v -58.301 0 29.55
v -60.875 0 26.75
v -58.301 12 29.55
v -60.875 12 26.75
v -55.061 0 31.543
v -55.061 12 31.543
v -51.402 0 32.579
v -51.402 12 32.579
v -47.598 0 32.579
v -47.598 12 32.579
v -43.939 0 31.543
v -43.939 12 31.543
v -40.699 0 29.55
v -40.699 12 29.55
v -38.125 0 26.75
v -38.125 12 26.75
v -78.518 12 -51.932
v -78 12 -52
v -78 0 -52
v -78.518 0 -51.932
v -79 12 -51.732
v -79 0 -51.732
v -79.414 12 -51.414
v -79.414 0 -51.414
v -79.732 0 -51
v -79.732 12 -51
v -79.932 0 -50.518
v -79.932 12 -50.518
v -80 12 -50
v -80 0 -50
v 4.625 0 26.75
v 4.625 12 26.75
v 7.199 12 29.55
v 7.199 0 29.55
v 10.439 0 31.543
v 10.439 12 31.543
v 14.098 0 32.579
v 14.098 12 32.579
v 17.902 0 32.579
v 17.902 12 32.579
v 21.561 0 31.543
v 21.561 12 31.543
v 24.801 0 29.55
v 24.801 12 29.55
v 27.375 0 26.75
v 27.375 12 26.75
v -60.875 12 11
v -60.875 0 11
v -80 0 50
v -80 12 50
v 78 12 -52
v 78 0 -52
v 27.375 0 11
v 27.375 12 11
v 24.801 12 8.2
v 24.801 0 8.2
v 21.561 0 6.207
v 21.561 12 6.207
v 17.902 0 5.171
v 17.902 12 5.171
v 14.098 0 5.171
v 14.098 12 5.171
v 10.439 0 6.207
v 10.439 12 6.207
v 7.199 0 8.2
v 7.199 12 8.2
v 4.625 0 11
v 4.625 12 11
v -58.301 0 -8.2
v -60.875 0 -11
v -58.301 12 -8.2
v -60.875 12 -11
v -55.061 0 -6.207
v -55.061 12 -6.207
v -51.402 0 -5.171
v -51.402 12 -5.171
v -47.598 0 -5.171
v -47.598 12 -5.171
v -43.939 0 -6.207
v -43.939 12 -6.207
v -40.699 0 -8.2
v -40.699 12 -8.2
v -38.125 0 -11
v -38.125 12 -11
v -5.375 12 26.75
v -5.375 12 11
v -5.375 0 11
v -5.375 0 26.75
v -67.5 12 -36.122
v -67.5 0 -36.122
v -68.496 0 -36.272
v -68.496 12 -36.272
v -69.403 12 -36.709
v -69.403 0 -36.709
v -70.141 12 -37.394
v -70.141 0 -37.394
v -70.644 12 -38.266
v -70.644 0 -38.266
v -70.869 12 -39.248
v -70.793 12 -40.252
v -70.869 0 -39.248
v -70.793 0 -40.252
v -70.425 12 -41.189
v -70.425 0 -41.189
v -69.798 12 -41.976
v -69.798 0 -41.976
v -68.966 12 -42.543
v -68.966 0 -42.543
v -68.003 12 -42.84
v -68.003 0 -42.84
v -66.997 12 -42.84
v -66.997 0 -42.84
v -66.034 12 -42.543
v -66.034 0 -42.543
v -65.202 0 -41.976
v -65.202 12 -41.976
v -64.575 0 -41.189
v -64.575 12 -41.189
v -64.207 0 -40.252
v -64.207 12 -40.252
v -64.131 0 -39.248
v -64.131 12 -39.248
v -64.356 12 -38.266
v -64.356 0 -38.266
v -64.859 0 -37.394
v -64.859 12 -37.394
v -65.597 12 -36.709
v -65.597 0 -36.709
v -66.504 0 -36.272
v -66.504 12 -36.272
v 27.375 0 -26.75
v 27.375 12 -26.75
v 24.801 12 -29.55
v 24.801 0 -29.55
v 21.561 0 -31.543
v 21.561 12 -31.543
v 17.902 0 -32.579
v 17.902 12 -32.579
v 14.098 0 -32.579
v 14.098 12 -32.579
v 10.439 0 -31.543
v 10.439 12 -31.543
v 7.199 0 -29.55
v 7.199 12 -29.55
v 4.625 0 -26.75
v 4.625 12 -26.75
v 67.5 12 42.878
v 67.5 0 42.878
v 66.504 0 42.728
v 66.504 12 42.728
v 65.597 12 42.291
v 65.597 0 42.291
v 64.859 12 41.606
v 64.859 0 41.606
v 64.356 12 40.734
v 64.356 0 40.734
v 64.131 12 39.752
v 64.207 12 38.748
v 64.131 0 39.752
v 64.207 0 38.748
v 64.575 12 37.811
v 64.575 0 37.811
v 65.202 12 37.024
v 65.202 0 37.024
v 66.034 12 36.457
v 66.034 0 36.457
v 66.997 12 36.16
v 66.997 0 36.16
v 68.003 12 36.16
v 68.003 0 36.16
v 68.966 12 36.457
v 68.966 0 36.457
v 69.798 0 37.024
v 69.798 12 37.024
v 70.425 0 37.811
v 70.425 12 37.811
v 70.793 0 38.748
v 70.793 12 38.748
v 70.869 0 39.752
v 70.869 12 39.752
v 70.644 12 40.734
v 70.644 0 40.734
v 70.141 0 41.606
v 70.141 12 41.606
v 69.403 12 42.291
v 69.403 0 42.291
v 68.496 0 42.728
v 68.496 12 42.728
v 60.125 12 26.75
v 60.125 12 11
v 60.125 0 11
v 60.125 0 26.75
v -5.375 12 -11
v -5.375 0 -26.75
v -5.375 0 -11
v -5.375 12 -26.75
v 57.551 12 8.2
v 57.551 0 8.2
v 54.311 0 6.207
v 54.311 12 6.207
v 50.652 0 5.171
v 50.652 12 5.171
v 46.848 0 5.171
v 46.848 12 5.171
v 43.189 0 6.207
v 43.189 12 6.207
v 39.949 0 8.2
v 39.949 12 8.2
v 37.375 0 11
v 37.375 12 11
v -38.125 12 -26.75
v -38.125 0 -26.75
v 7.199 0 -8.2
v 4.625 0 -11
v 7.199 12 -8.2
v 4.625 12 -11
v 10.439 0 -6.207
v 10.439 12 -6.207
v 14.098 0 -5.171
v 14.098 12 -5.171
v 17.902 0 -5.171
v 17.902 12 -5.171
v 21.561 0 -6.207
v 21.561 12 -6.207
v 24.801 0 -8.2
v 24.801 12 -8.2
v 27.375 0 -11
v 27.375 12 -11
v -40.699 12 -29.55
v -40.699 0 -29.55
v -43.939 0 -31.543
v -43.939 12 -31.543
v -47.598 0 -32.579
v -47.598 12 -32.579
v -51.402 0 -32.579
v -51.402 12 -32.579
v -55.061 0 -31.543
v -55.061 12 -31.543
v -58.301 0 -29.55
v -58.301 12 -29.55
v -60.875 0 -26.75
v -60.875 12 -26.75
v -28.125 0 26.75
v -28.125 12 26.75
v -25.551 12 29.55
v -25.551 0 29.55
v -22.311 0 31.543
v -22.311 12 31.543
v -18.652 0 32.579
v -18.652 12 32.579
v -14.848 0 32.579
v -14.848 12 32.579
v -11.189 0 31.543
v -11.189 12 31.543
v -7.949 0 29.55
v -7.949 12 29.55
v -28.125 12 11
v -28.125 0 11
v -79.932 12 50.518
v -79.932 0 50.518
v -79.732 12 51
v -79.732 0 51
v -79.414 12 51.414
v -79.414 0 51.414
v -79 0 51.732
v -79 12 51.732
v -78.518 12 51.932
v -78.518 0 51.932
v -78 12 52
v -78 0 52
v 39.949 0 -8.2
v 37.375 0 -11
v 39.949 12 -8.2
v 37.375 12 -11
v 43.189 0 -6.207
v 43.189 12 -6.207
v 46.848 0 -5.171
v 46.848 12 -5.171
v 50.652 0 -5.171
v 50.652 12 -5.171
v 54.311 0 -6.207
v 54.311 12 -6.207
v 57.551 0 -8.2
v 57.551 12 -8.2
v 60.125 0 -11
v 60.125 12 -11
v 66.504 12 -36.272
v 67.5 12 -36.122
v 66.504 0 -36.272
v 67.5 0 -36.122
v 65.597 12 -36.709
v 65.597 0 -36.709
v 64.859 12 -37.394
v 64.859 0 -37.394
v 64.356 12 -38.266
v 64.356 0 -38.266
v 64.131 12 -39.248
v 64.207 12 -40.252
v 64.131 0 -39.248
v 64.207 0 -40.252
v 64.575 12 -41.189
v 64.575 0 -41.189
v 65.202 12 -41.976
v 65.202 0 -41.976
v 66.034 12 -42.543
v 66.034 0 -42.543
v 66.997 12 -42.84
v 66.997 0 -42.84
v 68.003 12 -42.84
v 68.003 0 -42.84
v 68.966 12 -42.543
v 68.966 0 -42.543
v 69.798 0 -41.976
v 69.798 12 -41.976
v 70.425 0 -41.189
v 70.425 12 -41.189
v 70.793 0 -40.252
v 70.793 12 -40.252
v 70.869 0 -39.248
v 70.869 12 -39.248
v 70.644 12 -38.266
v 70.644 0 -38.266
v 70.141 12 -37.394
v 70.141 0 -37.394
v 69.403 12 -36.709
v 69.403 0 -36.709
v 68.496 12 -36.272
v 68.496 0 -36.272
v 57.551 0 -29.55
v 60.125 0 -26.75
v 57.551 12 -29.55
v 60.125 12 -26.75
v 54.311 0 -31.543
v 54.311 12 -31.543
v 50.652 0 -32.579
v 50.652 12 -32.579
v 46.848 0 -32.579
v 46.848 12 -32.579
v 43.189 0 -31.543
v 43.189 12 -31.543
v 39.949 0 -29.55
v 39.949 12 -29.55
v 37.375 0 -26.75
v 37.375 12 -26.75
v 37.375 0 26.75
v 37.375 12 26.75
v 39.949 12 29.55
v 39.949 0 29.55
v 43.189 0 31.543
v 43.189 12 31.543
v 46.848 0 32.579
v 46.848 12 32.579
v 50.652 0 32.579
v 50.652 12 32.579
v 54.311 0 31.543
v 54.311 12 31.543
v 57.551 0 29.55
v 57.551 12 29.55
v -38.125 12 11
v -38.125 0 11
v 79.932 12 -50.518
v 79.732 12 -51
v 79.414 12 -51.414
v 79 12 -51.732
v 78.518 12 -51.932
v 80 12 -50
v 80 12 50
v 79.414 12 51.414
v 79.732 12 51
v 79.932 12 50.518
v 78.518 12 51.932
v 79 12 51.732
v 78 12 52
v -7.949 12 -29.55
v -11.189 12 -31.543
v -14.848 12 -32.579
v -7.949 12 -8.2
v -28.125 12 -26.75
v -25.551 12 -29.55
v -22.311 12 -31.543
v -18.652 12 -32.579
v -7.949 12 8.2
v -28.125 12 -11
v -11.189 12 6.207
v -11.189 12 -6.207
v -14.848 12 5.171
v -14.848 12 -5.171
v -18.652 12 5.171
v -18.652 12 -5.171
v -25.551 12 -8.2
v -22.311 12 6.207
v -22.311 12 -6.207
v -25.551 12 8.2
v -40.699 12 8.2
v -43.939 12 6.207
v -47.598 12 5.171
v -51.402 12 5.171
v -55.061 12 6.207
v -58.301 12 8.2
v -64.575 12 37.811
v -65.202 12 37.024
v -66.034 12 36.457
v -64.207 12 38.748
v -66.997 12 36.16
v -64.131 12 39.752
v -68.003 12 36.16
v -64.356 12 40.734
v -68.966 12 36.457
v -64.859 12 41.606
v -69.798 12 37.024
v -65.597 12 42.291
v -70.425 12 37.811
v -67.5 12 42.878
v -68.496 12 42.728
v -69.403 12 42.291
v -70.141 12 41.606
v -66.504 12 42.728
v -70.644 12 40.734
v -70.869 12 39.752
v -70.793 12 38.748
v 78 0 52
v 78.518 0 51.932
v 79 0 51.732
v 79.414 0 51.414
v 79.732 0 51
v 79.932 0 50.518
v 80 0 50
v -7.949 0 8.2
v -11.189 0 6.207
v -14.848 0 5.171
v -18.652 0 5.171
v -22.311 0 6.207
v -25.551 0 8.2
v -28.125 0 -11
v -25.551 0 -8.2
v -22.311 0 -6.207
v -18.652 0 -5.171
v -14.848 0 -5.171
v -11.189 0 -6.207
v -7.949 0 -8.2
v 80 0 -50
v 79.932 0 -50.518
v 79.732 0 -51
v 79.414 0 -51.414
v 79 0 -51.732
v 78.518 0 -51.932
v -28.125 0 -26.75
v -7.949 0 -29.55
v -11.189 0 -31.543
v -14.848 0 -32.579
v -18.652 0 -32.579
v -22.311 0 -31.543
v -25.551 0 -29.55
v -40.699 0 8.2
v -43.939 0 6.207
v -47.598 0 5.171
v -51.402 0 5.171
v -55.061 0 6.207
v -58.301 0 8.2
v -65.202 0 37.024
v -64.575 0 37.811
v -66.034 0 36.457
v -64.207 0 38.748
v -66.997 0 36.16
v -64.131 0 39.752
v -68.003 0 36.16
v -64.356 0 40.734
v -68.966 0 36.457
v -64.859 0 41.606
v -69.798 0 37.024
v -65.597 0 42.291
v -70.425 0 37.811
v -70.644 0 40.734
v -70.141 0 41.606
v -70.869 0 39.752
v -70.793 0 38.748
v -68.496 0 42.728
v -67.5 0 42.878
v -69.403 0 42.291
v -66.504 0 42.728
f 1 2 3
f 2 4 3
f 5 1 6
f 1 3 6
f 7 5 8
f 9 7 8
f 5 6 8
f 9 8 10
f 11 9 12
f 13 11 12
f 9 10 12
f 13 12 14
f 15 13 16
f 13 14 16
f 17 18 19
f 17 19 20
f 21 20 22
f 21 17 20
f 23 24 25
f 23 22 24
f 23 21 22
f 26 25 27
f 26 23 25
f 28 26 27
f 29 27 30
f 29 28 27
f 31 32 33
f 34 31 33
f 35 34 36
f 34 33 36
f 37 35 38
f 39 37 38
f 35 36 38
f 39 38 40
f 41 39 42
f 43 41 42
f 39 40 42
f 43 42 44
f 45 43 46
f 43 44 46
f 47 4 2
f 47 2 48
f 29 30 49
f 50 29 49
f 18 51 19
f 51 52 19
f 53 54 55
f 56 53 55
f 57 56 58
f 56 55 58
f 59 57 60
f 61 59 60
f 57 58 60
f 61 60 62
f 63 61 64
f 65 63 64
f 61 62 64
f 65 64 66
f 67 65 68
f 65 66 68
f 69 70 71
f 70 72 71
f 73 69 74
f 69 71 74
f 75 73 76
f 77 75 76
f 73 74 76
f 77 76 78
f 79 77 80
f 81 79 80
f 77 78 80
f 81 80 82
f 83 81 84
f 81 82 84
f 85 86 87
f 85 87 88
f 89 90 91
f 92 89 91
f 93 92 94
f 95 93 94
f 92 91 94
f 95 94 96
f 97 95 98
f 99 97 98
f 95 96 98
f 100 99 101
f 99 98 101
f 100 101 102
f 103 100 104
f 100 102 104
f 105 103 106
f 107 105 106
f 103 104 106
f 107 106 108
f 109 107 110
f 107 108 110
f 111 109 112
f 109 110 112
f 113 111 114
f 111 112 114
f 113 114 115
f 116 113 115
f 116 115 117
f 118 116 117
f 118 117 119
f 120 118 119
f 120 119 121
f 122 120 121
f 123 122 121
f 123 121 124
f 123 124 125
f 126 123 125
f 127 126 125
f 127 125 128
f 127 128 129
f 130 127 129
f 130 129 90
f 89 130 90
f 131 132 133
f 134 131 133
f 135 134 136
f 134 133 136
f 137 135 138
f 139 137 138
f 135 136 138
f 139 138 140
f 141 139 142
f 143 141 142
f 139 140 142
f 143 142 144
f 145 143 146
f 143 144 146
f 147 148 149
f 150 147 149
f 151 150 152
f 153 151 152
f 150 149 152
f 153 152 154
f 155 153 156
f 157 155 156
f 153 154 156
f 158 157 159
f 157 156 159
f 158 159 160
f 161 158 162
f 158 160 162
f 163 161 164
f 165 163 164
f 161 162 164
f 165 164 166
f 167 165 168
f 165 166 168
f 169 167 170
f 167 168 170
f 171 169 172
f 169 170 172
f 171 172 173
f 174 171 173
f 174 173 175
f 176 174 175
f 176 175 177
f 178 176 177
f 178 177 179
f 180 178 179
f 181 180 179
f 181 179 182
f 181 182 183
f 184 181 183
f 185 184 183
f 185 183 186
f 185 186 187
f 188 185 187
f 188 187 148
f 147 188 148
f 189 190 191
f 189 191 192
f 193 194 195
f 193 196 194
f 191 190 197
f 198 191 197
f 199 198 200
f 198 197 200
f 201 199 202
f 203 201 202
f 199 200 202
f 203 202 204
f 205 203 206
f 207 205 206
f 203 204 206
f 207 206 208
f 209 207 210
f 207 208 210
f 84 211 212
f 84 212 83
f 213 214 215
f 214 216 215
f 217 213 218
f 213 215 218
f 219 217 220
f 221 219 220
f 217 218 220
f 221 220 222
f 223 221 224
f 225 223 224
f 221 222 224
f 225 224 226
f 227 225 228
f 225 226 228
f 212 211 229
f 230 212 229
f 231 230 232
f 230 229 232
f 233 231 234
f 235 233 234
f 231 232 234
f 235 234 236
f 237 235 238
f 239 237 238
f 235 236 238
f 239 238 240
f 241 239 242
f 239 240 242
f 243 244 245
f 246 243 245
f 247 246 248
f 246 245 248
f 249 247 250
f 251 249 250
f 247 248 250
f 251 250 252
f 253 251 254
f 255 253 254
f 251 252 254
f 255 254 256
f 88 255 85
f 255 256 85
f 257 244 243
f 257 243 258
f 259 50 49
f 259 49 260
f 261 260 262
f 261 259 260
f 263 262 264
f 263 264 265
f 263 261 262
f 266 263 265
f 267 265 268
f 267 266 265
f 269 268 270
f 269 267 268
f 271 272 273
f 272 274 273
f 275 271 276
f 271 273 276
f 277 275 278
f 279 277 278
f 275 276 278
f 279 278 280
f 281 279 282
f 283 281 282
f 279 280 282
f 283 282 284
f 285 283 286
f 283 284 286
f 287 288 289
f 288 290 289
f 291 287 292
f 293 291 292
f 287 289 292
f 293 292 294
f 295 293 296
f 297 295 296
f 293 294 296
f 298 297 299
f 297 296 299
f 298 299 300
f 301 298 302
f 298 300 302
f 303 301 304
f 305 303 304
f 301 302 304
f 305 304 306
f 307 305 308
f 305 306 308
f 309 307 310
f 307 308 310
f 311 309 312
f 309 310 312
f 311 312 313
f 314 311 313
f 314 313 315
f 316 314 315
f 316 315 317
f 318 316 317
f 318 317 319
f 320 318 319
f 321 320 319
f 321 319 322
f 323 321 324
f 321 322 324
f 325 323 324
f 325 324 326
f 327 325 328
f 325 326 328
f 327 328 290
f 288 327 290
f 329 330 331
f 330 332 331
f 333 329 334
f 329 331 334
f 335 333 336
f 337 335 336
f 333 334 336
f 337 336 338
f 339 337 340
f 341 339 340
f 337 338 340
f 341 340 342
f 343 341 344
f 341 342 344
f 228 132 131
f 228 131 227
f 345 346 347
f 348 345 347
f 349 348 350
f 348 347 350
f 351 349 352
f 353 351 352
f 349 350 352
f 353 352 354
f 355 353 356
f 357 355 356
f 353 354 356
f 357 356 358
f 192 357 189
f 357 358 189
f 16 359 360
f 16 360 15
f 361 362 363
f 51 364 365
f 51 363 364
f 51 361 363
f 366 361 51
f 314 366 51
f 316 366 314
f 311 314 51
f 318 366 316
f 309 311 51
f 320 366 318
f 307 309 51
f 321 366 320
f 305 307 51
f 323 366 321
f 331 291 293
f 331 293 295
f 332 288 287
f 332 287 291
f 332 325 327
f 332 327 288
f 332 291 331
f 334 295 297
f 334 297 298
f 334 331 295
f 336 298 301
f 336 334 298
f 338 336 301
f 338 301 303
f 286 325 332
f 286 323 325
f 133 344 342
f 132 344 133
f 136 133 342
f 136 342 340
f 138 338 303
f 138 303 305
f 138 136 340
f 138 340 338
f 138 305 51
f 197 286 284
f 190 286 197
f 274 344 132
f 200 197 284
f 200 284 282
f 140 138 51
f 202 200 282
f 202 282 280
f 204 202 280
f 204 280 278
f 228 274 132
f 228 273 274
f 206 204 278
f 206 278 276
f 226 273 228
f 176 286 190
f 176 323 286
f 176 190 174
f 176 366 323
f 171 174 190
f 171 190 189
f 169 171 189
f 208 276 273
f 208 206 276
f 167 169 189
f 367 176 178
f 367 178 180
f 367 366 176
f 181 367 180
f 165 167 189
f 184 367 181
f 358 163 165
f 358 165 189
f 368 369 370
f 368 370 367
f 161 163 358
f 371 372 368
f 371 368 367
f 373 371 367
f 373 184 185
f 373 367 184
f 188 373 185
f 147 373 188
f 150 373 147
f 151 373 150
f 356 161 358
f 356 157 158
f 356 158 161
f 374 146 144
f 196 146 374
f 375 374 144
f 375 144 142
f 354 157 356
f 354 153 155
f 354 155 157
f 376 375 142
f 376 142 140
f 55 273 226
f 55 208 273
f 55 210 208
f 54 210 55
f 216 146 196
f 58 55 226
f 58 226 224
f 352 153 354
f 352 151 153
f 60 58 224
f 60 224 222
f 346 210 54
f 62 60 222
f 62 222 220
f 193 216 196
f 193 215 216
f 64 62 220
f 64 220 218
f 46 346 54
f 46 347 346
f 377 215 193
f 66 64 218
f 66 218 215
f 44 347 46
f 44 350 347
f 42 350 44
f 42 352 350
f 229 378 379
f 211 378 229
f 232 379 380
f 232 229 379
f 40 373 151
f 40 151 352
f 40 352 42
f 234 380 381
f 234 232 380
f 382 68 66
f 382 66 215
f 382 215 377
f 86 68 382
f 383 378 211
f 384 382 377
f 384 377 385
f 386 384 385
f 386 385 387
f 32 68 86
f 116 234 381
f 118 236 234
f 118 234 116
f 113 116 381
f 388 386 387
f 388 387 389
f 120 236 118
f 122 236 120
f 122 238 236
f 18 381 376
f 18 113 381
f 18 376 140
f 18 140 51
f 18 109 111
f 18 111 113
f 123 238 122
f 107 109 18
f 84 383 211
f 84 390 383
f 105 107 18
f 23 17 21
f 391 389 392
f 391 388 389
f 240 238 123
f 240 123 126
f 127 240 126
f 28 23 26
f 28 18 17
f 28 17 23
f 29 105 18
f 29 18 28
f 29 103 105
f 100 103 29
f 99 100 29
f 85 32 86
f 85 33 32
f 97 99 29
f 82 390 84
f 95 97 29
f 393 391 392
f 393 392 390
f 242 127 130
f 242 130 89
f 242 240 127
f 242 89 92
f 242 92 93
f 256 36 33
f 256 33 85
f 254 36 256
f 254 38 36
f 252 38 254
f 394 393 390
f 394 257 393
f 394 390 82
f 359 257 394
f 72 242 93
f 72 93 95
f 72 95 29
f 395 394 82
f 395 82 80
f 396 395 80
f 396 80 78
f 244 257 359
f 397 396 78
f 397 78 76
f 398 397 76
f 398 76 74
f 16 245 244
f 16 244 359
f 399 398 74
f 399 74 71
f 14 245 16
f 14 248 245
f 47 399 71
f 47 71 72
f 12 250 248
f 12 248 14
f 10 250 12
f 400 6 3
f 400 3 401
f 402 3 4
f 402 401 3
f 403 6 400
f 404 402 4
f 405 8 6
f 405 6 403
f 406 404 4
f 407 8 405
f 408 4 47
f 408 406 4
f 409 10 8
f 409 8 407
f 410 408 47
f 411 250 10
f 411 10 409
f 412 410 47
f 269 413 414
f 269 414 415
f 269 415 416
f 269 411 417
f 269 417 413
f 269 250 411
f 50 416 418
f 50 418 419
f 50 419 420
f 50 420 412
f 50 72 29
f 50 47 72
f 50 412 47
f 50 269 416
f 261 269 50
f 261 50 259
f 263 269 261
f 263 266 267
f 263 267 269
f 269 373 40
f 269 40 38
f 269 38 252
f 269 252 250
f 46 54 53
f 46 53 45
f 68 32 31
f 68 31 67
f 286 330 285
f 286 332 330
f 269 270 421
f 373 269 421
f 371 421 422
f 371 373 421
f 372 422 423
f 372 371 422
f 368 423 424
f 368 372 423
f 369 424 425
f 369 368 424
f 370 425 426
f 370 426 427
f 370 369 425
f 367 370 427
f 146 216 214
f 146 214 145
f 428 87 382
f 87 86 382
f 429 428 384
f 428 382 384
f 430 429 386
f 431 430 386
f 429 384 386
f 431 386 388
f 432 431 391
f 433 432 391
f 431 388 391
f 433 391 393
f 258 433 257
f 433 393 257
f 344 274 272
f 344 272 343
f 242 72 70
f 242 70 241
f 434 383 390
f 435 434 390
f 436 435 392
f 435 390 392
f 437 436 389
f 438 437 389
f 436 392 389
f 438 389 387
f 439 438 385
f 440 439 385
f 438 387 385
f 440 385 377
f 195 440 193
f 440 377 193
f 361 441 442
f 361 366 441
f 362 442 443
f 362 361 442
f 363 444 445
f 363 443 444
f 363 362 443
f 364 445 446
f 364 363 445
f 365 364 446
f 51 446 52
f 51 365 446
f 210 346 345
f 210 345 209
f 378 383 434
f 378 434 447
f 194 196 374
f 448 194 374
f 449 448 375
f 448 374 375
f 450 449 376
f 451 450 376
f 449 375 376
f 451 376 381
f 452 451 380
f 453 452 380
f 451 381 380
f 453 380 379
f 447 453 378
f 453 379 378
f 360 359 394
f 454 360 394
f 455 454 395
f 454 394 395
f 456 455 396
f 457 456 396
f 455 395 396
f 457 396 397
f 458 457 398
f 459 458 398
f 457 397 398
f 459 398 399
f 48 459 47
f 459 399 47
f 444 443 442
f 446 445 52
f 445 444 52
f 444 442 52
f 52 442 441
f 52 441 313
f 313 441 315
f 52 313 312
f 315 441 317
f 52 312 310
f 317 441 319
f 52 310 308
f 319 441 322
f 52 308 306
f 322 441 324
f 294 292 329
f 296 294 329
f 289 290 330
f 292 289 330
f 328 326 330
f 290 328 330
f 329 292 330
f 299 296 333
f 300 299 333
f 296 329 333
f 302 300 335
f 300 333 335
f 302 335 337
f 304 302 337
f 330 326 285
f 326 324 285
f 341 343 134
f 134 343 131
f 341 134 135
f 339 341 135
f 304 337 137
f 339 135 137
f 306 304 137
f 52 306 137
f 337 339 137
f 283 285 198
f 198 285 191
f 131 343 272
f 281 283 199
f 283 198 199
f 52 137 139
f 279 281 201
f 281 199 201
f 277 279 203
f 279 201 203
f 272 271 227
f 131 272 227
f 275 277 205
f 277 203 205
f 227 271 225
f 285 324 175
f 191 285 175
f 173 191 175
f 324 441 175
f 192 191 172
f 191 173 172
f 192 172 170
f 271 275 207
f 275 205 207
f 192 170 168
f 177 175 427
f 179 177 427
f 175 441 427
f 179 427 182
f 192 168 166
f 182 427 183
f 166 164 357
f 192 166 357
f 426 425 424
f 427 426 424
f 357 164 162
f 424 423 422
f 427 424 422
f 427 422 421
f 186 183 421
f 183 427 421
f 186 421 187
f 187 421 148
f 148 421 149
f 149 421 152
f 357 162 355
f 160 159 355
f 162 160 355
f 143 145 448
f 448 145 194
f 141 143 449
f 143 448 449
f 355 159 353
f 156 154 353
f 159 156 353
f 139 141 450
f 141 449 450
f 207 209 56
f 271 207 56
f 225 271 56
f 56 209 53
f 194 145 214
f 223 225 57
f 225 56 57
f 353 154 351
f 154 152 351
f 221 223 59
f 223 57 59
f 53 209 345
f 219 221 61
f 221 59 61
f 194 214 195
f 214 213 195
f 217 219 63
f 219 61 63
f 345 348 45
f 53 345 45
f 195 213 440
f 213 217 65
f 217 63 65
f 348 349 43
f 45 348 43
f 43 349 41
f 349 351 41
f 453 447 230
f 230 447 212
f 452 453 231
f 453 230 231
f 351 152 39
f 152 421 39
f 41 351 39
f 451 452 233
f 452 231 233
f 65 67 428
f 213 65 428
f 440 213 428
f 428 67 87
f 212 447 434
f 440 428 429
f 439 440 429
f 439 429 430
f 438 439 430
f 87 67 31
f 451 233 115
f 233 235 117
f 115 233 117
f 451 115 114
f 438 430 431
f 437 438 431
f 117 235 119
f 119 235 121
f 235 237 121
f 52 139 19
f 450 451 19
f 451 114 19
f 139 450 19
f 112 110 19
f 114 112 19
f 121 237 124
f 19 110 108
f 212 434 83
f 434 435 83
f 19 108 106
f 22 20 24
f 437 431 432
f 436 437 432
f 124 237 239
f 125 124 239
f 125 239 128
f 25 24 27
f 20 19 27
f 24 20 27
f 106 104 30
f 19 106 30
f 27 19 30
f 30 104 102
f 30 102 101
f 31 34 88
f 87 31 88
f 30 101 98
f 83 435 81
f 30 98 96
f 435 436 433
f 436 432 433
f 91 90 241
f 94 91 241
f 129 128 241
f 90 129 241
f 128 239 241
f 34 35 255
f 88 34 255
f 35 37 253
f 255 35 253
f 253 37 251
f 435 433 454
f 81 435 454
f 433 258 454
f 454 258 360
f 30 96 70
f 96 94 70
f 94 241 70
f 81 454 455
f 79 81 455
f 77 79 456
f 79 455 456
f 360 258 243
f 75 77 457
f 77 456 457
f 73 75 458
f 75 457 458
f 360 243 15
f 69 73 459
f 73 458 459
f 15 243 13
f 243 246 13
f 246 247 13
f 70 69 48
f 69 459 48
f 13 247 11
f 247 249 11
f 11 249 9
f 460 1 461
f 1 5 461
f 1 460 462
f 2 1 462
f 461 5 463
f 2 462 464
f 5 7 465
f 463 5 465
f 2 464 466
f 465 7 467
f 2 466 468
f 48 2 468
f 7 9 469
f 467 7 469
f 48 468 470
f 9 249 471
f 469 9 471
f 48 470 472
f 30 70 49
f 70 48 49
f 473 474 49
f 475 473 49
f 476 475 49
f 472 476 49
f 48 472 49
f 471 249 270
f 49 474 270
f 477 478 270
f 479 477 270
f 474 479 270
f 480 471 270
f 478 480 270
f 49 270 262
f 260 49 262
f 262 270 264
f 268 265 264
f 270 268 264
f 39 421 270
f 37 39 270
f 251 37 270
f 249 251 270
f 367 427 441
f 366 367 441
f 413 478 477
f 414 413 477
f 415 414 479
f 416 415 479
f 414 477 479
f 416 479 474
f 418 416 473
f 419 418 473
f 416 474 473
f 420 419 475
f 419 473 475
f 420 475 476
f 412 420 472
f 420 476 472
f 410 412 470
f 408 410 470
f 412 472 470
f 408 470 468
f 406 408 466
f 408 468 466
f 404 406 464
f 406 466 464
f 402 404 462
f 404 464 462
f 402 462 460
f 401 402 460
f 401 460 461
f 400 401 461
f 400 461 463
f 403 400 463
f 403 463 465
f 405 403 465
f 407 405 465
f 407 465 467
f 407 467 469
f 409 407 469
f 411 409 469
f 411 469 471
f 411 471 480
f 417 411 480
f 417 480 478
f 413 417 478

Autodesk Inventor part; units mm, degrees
ref_plane "YZ Plane" through (0, 0, 0) normal (1, 0, 0) x (0, 1, 0)
ref_plane "XZ Plane" through (0, 0, 0) normal (0, 1, 0) x (-1, 0, 0)
ref_plane "XY Plane" through (0, 0, 0) normal (0, 0, 1) x (1, 0, 0)
sketch "Sketch1" plane through (0, 0, 0) normal (0, 1, 0) x (-1, 0, 0)
  line L0 (80, 52) -> (-80, 52)
  line L1 (-80, 52) -> (-80, -52)
  line L2 (-80, -52) -> (80, -52)
  line L3 (80, -52) -> (80, 52)
  line L4 (80, 52) -> (-80, -52) construction
  line L5 (-80, 52) -> (80, -52) construction
  point P0 (0, 0)
  dimension "d0" = 160
  dimension "d1" = 104
extrude "Extrusion1" add sketch "Sketch1" along normal blind 12
sketch "Sketch2" plane through (0, 12, 0) normal (0, 1, 0) x (1, 0, 0)
  line L0 (-80, 52) -> (-80, -52) projected
  line L1 (80, 52) -> (-80, 52) projected
  line L2 (-38.125, 26.75) -> (-38.125, 11)
  line L3 (-60.875, 11) -> (-60.875, 26.75)
  arc A0 (-38.125, 26.75) -> (-60.875, 26.75) centre (-49.5, 18.875) ccw
  arc A1 (-60.875, 11) -> (-38.125, 11) centre (-49.5, 18.875) ccw
  point P0 (0, 0)
  dimension "d39" = 22.75
  dimension "d40" = 15.75
  dimension "d41" = 19.125
  dimension "d42" = 7.875
  dimension "d43" = 33.125
extrude "Extrusion2" cut sketch "Sketch2" against normal up to next
pattern_linear "Rectangular Pattern1" count 4 spacing -32.75 along (-1, 0, 0) count 2 spacing 37.75 along (0, 0, 1) of "Extrusion2"
sketch "Sketch4" plane through (0, 12, 0) normal (0, 1, 0) x (1, 0, 0)
  line L0 (-80, 52) -> (-80, -52) projected
  line L1 (80, 52) -> (-80, 52) projected
  line L2 (80, -52) -> (80, 52) projected
  line L3 (-80, -52) -> (80, -52) projected
  point P0 (0, 0)
  point P1 (-67.5, 39.5)
  point P2 (67.5, 39.5)
  point P3 (67.5, -39.5)
  point P4 (-67.5, -39.5)
  dimension "d24" = 12.5
  dimension "d25" = 12.5
  dimension "d26" = 12.5
  dimension "d27" = 12.5
  dimension "d28" = 12.5
  dimension "d29" = 12.5
  dimension "d30" = 12.5
  dimension "d31" = 12.5
hole "Hole1" at (-67.5, 12, -39.5) at (67.5, 12, -39.5) at (67.5, 12, 39.5) at (-67.5, 12, 39.5) direction (0, -1, 0) diameter 6.756 depth 25.4 clearance for "Socket Head Cap Screw" size "1/4" standard "Ansi Unified Screw Threads"
fillet "Fillet1" radius 2 4 edges at (-80, 6, 52) (80, 6, 52) (80, 6, -52) (-80, 6, -52)
properties part number "4_OM_VialPlate_0.25mmReduce"
